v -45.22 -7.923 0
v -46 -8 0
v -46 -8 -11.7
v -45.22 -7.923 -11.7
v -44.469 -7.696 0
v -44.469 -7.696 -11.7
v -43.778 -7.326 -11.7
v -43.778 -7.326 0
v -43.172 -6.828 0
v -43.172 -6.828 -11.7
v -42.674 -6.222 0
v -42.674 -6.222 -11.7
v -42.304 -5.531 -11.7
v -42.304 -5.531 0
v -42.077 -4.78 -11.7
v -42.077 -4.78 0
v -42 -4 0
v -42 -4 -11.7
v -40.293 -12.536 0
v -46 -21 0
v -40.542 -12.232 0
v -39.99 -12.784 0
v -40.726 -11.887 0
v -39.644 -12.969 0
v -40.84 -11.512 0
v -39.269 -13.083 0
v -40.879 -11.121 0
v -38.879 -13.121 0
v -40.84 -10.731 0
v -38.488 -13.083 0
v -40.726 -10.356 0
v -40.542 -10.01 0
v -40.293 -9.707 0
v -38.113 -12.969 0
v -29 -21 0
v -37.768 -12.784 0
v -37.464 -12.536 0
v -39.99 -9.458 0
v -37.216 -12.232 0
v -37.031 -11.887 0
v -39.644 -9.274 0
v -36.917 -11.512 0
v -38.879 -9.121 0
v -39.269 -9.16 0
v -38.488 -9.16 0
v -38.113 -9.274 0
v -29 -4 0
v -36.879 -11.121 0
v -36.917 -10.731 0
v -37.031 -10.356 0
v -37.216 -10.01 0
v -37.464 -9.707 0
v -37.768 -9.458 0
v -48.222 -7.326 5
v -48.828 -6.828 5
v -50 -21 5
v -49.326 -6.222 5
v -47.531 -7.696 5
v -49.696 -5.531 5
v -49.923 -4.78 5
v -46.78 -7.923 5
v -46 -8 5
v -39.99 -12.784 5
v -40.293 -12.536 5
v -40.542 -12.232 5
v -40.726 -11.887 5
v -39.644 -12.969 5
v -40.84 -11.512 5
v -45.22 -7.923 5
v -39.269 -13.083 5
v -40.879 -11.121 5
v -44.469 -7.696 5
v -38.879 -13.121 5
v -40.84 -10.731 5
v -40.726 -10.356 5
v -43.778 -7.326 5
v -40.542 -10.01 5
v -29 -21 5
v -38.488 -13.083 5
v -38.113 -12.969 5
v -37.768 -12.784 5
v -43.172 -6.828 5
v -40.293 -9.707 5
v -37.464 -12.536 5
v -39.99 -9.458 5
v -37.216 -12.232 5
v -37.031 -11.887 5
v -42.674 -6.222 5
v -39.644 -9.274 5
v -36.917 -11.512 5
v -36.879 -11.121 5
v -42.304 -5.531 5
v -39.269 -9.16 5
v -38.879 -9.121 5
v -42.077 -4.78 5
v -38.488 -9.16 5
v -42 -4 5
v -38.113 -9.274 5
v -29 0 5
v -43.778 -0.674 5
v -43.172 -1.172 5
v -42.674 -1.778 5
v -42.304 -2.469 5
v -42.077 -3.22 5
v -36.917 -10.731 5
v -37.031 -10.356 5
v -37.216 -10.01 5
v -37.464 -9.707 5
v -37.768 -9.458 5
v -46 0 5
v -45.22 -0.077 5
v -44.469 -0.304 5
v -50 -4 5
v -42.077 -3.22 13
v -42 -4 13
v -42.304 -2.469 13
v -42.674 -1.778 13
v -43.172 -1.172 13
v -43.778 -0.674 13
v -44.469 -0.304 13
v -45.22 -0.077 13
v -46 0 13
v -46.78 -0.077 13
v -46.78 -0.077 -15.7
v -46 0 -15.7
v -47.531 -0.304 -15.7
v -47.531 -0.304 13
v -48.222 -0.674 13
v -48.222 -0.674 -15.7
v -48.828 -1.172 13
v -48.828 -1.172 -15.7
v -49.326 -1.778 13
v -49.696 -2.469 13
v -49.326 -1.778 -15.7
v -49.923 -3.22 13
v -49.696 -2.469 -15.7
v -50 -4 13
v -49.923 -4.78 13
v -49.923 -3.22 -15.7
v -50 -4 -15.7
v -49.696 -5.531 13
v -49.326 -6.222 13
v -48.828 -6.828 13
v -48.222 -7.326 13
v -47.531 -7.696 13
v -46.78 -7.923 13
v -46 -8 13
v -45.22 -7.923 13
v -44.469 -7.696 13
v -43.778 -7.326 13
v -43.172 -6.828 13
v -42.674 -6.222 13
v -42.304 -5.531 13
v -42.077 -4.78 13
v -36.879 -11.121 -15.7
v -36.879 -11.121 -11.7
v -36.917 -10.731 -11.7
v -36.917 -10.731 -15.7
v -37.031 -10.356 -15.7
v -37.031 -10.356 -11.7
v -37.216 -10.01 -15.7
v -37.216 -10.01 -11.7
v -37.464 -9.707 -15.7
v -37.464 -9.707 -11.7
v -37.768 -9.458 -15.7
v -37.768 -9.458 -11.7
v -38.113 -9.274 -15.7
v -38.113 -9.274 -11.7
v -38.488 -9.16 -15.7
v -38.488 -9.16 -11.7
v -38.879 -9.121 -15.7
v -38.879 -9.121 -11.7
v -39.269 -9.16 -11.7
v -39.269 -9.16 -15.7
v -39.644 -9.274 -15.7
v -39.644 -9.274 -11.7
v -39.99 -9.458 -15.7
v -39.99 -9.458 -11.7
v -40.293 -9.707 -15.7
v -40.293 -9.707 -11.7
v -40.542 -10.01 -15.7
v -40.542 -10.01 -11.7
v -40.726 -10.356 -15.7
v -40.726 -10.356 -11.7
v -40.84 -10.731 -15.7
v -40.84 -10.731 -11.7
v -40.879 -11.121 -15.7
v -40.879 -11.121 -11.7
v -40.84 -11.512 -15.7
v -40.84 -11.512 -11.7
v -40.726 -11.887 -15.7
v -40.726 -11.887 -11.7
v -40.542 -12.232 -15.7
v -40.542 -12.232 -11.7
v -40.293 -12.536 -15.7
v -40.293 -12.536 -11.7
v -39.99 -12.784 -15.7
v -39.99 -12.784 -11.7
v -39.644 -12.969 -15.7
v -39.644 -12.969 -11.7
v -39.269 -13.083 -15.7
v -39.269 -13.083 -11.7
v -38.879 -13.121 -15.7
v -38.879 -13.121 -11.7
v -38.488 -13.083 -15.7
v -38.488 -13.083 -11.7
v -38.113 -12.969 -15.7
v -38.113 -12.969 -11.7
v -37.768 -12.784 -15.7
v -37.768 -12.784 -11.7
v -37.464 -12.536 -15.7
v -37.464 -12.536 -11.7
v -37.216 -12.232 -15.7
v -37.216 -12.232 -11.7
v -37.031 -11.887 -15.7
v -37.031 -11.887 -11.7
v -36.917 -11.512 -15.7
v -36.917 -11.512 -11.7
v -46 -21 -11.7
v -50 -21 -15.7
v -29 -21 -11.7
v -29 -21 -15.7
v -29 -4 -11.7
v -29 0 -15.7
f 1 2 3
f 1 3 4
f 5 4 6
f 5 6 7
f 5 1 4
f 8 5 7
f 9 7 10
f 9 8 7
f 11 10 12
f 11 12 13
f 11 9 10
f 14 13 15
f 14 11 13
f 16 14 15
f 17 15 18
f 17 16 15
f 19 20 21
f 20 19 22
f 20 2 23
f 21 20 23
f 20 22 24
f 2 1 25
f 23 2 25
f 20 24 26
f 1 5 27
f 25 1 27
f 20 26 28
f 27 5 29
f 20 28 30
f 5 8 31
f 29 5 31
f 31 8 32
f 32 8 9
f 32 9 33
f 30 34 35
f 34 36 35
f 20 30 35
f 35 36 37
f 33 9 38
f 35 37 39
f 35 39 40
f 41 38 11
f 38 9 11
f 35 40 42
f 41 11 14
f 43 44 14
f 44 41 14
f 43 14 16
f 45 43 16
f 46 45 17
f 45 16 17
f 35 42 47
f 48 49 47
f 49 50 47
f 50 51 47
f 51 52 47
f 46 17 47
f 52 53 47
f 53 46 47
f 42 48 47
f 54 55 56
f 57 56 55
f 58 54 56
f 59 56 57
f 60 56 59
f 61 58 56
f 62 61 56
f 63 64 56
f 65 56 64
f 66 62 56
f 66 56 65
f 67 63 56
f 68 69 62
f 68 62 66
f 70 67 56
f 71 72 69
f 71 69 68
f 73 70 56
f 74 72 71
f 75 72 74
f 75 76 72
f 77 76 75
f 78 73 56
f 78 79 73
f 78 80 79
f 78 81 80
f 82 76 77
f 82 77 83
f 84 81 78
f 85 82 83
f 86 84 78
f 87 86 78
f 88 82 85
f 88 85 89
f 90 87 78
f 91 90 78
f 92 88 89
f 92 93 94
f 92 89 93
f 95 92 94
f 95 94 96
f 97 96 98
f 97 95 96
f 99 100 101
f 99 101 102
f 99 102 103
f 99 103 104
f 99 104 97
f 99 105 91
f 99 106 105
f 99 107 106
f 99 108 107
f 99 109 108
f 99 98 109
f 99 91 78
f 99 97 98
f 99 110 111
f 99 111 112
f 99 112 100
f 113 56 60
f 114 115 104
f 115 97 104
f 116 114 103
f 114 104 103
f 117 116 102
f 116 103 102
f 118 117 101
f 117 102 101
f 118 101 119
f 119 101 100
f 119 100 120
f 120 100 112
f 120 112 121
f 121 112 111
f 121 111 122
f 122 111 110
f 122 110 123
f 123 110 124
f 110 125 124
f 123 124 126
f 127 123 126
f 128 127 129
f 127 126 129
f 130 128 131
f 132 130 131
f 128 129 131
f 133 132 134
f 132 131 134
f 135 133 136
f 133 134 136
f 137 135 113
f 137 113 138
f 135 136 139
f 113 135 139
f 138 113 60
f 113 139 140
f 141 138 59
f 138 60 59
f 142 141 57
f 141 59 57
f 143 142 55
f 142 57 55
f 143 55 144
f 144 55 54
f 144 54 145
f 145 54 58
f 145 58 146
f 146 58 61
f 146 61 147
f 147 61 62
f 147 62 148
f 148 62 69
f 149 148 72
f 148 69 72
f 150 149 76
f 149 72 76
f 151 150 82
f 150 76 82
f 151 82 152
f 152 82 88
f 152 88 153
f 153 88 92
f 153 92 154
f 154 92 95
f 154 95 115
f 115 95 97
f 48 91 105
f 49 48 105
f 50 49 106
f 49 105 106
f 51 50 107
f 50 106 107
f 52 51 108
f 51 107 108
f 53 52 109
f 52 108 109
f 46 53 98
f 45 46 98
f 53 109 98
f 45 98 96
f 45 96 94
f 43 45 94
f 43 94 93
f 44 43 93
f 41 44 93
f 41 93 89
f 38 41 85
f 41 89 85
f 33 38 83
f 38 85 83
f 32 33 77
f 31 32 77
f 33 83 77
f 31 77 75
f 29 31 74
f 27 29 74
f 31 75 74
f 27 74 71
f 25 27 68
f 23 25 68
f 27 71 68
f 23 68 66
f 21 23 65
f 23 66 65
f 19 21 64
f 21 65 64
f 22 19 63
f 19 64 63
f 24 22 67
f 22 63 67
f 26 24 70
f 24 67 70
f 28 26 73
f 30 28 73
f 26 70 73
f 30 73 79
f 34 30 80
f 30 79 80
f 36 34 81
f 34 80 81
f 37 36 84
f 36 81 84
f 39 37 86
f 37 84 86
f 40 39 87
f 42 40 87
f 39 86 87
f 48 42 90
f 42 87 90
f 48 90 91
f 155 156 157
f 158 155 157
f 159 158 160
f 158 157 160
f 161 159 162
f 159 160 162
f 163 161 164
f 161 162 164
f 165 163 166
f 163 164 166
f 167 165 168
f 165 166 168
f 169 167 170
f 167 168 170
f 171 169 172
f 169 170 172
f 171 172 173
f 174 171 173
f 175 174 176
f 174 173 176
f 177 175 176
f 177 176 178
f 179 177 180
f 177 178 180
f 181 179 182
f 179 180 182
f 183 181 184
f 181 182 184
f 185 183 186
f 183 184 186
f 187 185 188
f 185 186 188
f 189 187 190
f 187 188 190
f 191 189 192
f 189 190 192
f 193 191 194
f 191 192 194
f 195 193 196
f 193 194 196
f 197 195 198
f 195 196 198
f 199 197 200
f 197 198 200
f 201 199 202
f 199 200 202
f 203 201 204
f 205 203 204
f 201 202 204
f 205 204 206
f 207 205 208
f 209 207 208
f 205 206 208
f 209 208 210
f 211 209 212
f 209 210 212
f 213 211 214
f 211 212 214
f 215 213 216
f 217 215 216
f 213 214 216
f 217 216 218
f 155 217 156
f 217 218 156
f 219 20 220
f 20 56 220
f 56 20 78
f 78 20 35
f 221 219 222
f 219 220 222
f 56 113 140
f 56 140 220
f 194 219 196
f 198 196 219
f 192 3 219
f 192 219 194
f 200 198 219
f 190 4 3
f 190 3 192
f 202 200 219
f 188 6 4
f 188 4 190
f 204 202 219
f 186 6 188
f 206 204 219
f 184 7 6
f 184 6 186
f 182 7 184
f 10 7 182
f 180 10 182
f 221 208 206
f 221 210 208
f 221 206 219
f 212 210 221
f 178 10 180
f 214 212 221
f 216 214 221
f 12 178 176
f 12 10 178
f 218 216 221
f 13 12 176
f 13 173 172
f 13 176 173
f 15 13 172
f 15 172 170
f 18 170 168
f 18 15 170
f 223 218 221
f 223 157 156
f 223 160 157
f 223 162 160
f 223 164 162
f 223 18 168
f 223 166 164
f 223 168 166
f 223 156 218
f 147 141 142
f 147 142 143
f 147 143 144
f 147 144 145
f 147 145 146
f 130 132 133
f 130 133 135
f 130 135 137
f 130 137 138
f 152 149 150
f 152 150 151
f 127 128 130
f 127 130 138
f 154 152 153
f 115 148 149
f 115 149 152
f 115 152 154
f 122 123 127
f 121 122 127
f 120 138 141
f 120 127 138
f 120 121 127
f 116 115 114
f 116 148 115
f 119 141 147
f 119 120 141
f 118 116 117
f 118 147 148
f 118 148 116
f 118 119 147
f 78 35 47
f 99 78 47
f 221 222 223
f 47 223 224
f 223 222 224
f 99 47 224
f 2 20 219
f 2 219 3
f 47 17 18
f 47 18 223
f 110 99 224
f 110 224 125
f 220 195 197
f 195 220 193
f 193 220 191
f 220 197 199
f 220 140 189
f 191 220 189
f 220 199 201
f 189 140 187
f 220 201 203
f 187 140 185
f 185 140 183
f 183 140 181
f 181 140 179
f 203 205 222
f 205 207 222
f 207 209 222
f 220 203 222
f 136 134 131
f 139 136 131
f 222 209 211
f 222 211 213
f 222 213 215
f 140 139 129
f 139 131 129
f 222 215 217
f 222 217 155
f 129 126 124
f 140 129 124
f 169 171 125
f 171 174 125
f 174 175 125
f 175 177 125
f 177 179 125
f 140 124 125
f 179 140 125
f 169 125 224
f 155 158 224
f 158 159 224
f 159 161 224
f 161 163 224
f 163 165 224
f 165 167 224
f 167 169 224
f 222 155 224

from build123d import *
from build123d.topology import SkipClean

# Parameters (mm, degrees)
BOSS_EXTRUDE1_DEPTH     = 11.7
BOSS_EXTRUDE4_START     = 8
SKETCH1_6_R             = 4
BOSS_EXTRUDE4_DEPTH     = 8
BOSS_EXTRUDE5_START     = -11.7
SKETCH1_7_R             = 2
BOSS_EXTRUDE5_DEPTH     = 4
BOSS_EXTRUDE6_START     = 5
SKETCH1_8_R             = 2
BOSS_EXTRUDE6_DEPTH     = 5
BOSS_EXTRUDE7_START     = 8
BOSS_EXTRUDE7_OUTLINE_R = 4
BOSS_EXTRUDE7_DEPTH     = 5
SKETCH2_W               = 7
SKETCH2_H               = 10
SKETCH2_H_2             = 7
SKETCH2_W_2             = 10
BOSS_EXTRUDE8_DEPTH     = 5
BOSS_EXTRUDE9_START     = -20.7
SKETCH2_3_W             = 7
SKETCH2_3_H             = 10
SKETCH2_3_W_2           = 10
SKETCH2_3_H_2           = 7
BOSS_EXTRUDE9_DEPTH     = 4


# Read off the part's stored shape, not the designer's step: Boss-Extrude7
with BuildPart() as part:
    # Sketch1 → Boss-Extrude1 (new body)
    with BuildSketch(Plane.XY):
        with BuildLine():
            Line((-36, -4), (-29, -4))
            Line((-29, -4), (-29, 0))
            Line((-29, 0), (-46, 0))
            ThreePointArc((-46, 0), (-43.171572875, -1.171572875), (-42, -4))
            Line((-42, -4), (-36, -4))
        make_face()
        with BuildLine():
            ThreePointArc((-46, -8), (-43.171572875, -6.828427125), (-42, -4))
            Line((-42, -4), (-46, -4))
            Line((-46, -4), (-46, -8))
        make_face()
        with BuildLine():
            Line((-46, -4), (-42, -4))
            ThreePointArc((-42, -4), (-43.171572875, -1.171572875), (-46, 0))
            Line((-46, 0), (-46, -4))
        make_face()
        with BuildLine():
            Line((-46, -4), (-46, 0))
            ThreePointArc((-46, 0), (-48.828427125, -1.171572875), (-50, -4))
            Line((-50, -4), (-46, -4))
        make_face()
        with BuildLine():
            Line((-46, -8), (-46, -4))
            Line((-46, -4), (-50, -4))
            ThreePointArc((-50, -4), (-48.828427125, -6.828427125), (-46, -8))
        make_face()
        with BuildLine():
            Line((-46, -14), (-46, -8))
            ThreePointArc((-46, -8), (-48.828427125, -6.828427125), (-50, -4))
            Line((-50, -4), (-50, -21))
            Line((-50, -21), (-46, -21))
            Line((-46, -21), (-46, -14))
        make_face()
    extrude(amount=-BOSS_EXTRUDE1_DEPTH)

    # Sketch1<6> → Boss-Extrude4 (add)
    with BuildSketch(Plane.XY.offset(BOSS_EXTRUDE4_START)):
        with Locations((-46, -4)):
            Circle(SKETCH1_6_R)
    extrude(amount=-BOSS_EXTRUDE4_DEPTH)

    # Sketch1<7> → Boss-Extrude5 (add)
    with SkipClean():  # the faces are left unmerged after this step: merging them gives an invalid solid
        with BuildSketch(Plane.XY.offset(BOSS_EXTRUDE5_START)):
            with BuildLine():
                Line((-36, -4), (-29, -4))
                Line((-29, -4), (-29, 0))
                Line((-29, 0), (-46, 0))
                ThreePointArc((-46, 0), (-48.828427125, -1.171572875), (-50, -4))
                Line((-50, -4), (-50, -21))
                Line((-50, -21), (-46, -21))
                Line((-46, -21), (-46, -14))
                Line((-46, -14), (-36, -14))
                Line((-36, -14), (-36, -4))
            make_face()
            with Locations((-38.878679656, -11.121320344)):
                Circle(SKETCH1_7_R, mode=Mode.SUBTRACT)
        extrude(amount=-BOSS_EXTRUDE5_DEPTH)

    # Sketch1<8> → Boss-Extrude6 (add)
    # profile 1 of 3: a face of its own
    with BuildSketch(Plane.XY.offset(BOSS_EXTRUDE6_START)):
        with BuildLine():
            Line((-46, -14), (-46, -8))
            ThreePointArc((-46, -8), (-48.828427125, -6.828427125), (-50, -4))
            Line((-50, -4), (-50, -21))
            Line((-50, -21), (-46, -21))
            Line((-46, -21), (-46, -14))
        make_face()
    # profile 2 of 3: a face of its own
    with BuildSketch(Plane.XY.offset(BOSS_EXTRUDE6_START)):
        with BuildLine():
            Line((-36, -14), (-36, -4))
            Line((-36, -4), (-42, -4))
            ThreePointArc((-42, -4), (-43.171572875, -6.828427125), (-46, -8))
            Line((-46, -8), (-46, -14))
            Line((-46, -14), (-36, -14))
        make_face()
        with Locations((-38.878679656, -11.121320344)):
            Circle(SKETCH1_8_R, mode=Mode.SUBTRACT)
    # profile 3 of 3: a face of its own
    with BuildSketch(Plane.XY.offset(BOSS_EXTRUDE6_START)):
        with BuildLine():
            Line((-36, -4), (-29, -4))
            Line((-29, -4), (-29, 0))
            Line((-29, 0), (-46, 0))
            ThreePointArc((-46, 0), (-43.171572875, -1.171572875), (-42, -4))
            Line((-42, -4), (-36, -4))
        make_face()
    extrude(amount=-BOSS_EXTRUDE6_DEPTH)

    # Boss-Extrude7 outline → Boss-Extrude7 (add)
    with BuildSketch(Plane.XY.offset(BOSS_EXTRUDE7_START)):
        with Locations((-46, -4)):
            Circle(BOSS_EXTRUDE7_OUTLINE_R)
    extrude(amount=BOSS_EXTRUDE7_DEPTH)

    # Sketch2 → Boss-Extrude8 (add)
    with BuildSketch(Plane.XY.offset(5)):
        with Locations((-32.5, -9)):
            Rectangle(SKETCH2_W, SKETCH2_H)
        with Locations((-32.5, -17.5)):
            Rectangle(SKETCH2_W, SKETCH2_H_2)
        with Locations((-41, -17.5)):
            Rectangle(SKETCH2_W_2, SKETCH2_H_2)
    extrude(amount=-BOSS_EXTRUDE8_DEPTH)

    # Sketch2<3> → Boss-Extrude9 (add)
    with BuildSketch(Plane.XY.offset(5).offset(BOSS_EXTRUDE9_START)):
        with Locations((-32.5, -9)):
            Rectangle(SKETCH2_3_W, SKETCH2_3_H)
        with Locations((-41, -17.5)):
            Rectangle(SKETCH2_3_W_2, SKETCH2_3_H_2)
        with Locations((-32.5, -17.5)):
            Rectangle(SKETCH2_3_W, SKETCH2_3_H_2)
    extrude(amount=BOSS_EXTRUDE9_DEPTH)


solid = part.part
